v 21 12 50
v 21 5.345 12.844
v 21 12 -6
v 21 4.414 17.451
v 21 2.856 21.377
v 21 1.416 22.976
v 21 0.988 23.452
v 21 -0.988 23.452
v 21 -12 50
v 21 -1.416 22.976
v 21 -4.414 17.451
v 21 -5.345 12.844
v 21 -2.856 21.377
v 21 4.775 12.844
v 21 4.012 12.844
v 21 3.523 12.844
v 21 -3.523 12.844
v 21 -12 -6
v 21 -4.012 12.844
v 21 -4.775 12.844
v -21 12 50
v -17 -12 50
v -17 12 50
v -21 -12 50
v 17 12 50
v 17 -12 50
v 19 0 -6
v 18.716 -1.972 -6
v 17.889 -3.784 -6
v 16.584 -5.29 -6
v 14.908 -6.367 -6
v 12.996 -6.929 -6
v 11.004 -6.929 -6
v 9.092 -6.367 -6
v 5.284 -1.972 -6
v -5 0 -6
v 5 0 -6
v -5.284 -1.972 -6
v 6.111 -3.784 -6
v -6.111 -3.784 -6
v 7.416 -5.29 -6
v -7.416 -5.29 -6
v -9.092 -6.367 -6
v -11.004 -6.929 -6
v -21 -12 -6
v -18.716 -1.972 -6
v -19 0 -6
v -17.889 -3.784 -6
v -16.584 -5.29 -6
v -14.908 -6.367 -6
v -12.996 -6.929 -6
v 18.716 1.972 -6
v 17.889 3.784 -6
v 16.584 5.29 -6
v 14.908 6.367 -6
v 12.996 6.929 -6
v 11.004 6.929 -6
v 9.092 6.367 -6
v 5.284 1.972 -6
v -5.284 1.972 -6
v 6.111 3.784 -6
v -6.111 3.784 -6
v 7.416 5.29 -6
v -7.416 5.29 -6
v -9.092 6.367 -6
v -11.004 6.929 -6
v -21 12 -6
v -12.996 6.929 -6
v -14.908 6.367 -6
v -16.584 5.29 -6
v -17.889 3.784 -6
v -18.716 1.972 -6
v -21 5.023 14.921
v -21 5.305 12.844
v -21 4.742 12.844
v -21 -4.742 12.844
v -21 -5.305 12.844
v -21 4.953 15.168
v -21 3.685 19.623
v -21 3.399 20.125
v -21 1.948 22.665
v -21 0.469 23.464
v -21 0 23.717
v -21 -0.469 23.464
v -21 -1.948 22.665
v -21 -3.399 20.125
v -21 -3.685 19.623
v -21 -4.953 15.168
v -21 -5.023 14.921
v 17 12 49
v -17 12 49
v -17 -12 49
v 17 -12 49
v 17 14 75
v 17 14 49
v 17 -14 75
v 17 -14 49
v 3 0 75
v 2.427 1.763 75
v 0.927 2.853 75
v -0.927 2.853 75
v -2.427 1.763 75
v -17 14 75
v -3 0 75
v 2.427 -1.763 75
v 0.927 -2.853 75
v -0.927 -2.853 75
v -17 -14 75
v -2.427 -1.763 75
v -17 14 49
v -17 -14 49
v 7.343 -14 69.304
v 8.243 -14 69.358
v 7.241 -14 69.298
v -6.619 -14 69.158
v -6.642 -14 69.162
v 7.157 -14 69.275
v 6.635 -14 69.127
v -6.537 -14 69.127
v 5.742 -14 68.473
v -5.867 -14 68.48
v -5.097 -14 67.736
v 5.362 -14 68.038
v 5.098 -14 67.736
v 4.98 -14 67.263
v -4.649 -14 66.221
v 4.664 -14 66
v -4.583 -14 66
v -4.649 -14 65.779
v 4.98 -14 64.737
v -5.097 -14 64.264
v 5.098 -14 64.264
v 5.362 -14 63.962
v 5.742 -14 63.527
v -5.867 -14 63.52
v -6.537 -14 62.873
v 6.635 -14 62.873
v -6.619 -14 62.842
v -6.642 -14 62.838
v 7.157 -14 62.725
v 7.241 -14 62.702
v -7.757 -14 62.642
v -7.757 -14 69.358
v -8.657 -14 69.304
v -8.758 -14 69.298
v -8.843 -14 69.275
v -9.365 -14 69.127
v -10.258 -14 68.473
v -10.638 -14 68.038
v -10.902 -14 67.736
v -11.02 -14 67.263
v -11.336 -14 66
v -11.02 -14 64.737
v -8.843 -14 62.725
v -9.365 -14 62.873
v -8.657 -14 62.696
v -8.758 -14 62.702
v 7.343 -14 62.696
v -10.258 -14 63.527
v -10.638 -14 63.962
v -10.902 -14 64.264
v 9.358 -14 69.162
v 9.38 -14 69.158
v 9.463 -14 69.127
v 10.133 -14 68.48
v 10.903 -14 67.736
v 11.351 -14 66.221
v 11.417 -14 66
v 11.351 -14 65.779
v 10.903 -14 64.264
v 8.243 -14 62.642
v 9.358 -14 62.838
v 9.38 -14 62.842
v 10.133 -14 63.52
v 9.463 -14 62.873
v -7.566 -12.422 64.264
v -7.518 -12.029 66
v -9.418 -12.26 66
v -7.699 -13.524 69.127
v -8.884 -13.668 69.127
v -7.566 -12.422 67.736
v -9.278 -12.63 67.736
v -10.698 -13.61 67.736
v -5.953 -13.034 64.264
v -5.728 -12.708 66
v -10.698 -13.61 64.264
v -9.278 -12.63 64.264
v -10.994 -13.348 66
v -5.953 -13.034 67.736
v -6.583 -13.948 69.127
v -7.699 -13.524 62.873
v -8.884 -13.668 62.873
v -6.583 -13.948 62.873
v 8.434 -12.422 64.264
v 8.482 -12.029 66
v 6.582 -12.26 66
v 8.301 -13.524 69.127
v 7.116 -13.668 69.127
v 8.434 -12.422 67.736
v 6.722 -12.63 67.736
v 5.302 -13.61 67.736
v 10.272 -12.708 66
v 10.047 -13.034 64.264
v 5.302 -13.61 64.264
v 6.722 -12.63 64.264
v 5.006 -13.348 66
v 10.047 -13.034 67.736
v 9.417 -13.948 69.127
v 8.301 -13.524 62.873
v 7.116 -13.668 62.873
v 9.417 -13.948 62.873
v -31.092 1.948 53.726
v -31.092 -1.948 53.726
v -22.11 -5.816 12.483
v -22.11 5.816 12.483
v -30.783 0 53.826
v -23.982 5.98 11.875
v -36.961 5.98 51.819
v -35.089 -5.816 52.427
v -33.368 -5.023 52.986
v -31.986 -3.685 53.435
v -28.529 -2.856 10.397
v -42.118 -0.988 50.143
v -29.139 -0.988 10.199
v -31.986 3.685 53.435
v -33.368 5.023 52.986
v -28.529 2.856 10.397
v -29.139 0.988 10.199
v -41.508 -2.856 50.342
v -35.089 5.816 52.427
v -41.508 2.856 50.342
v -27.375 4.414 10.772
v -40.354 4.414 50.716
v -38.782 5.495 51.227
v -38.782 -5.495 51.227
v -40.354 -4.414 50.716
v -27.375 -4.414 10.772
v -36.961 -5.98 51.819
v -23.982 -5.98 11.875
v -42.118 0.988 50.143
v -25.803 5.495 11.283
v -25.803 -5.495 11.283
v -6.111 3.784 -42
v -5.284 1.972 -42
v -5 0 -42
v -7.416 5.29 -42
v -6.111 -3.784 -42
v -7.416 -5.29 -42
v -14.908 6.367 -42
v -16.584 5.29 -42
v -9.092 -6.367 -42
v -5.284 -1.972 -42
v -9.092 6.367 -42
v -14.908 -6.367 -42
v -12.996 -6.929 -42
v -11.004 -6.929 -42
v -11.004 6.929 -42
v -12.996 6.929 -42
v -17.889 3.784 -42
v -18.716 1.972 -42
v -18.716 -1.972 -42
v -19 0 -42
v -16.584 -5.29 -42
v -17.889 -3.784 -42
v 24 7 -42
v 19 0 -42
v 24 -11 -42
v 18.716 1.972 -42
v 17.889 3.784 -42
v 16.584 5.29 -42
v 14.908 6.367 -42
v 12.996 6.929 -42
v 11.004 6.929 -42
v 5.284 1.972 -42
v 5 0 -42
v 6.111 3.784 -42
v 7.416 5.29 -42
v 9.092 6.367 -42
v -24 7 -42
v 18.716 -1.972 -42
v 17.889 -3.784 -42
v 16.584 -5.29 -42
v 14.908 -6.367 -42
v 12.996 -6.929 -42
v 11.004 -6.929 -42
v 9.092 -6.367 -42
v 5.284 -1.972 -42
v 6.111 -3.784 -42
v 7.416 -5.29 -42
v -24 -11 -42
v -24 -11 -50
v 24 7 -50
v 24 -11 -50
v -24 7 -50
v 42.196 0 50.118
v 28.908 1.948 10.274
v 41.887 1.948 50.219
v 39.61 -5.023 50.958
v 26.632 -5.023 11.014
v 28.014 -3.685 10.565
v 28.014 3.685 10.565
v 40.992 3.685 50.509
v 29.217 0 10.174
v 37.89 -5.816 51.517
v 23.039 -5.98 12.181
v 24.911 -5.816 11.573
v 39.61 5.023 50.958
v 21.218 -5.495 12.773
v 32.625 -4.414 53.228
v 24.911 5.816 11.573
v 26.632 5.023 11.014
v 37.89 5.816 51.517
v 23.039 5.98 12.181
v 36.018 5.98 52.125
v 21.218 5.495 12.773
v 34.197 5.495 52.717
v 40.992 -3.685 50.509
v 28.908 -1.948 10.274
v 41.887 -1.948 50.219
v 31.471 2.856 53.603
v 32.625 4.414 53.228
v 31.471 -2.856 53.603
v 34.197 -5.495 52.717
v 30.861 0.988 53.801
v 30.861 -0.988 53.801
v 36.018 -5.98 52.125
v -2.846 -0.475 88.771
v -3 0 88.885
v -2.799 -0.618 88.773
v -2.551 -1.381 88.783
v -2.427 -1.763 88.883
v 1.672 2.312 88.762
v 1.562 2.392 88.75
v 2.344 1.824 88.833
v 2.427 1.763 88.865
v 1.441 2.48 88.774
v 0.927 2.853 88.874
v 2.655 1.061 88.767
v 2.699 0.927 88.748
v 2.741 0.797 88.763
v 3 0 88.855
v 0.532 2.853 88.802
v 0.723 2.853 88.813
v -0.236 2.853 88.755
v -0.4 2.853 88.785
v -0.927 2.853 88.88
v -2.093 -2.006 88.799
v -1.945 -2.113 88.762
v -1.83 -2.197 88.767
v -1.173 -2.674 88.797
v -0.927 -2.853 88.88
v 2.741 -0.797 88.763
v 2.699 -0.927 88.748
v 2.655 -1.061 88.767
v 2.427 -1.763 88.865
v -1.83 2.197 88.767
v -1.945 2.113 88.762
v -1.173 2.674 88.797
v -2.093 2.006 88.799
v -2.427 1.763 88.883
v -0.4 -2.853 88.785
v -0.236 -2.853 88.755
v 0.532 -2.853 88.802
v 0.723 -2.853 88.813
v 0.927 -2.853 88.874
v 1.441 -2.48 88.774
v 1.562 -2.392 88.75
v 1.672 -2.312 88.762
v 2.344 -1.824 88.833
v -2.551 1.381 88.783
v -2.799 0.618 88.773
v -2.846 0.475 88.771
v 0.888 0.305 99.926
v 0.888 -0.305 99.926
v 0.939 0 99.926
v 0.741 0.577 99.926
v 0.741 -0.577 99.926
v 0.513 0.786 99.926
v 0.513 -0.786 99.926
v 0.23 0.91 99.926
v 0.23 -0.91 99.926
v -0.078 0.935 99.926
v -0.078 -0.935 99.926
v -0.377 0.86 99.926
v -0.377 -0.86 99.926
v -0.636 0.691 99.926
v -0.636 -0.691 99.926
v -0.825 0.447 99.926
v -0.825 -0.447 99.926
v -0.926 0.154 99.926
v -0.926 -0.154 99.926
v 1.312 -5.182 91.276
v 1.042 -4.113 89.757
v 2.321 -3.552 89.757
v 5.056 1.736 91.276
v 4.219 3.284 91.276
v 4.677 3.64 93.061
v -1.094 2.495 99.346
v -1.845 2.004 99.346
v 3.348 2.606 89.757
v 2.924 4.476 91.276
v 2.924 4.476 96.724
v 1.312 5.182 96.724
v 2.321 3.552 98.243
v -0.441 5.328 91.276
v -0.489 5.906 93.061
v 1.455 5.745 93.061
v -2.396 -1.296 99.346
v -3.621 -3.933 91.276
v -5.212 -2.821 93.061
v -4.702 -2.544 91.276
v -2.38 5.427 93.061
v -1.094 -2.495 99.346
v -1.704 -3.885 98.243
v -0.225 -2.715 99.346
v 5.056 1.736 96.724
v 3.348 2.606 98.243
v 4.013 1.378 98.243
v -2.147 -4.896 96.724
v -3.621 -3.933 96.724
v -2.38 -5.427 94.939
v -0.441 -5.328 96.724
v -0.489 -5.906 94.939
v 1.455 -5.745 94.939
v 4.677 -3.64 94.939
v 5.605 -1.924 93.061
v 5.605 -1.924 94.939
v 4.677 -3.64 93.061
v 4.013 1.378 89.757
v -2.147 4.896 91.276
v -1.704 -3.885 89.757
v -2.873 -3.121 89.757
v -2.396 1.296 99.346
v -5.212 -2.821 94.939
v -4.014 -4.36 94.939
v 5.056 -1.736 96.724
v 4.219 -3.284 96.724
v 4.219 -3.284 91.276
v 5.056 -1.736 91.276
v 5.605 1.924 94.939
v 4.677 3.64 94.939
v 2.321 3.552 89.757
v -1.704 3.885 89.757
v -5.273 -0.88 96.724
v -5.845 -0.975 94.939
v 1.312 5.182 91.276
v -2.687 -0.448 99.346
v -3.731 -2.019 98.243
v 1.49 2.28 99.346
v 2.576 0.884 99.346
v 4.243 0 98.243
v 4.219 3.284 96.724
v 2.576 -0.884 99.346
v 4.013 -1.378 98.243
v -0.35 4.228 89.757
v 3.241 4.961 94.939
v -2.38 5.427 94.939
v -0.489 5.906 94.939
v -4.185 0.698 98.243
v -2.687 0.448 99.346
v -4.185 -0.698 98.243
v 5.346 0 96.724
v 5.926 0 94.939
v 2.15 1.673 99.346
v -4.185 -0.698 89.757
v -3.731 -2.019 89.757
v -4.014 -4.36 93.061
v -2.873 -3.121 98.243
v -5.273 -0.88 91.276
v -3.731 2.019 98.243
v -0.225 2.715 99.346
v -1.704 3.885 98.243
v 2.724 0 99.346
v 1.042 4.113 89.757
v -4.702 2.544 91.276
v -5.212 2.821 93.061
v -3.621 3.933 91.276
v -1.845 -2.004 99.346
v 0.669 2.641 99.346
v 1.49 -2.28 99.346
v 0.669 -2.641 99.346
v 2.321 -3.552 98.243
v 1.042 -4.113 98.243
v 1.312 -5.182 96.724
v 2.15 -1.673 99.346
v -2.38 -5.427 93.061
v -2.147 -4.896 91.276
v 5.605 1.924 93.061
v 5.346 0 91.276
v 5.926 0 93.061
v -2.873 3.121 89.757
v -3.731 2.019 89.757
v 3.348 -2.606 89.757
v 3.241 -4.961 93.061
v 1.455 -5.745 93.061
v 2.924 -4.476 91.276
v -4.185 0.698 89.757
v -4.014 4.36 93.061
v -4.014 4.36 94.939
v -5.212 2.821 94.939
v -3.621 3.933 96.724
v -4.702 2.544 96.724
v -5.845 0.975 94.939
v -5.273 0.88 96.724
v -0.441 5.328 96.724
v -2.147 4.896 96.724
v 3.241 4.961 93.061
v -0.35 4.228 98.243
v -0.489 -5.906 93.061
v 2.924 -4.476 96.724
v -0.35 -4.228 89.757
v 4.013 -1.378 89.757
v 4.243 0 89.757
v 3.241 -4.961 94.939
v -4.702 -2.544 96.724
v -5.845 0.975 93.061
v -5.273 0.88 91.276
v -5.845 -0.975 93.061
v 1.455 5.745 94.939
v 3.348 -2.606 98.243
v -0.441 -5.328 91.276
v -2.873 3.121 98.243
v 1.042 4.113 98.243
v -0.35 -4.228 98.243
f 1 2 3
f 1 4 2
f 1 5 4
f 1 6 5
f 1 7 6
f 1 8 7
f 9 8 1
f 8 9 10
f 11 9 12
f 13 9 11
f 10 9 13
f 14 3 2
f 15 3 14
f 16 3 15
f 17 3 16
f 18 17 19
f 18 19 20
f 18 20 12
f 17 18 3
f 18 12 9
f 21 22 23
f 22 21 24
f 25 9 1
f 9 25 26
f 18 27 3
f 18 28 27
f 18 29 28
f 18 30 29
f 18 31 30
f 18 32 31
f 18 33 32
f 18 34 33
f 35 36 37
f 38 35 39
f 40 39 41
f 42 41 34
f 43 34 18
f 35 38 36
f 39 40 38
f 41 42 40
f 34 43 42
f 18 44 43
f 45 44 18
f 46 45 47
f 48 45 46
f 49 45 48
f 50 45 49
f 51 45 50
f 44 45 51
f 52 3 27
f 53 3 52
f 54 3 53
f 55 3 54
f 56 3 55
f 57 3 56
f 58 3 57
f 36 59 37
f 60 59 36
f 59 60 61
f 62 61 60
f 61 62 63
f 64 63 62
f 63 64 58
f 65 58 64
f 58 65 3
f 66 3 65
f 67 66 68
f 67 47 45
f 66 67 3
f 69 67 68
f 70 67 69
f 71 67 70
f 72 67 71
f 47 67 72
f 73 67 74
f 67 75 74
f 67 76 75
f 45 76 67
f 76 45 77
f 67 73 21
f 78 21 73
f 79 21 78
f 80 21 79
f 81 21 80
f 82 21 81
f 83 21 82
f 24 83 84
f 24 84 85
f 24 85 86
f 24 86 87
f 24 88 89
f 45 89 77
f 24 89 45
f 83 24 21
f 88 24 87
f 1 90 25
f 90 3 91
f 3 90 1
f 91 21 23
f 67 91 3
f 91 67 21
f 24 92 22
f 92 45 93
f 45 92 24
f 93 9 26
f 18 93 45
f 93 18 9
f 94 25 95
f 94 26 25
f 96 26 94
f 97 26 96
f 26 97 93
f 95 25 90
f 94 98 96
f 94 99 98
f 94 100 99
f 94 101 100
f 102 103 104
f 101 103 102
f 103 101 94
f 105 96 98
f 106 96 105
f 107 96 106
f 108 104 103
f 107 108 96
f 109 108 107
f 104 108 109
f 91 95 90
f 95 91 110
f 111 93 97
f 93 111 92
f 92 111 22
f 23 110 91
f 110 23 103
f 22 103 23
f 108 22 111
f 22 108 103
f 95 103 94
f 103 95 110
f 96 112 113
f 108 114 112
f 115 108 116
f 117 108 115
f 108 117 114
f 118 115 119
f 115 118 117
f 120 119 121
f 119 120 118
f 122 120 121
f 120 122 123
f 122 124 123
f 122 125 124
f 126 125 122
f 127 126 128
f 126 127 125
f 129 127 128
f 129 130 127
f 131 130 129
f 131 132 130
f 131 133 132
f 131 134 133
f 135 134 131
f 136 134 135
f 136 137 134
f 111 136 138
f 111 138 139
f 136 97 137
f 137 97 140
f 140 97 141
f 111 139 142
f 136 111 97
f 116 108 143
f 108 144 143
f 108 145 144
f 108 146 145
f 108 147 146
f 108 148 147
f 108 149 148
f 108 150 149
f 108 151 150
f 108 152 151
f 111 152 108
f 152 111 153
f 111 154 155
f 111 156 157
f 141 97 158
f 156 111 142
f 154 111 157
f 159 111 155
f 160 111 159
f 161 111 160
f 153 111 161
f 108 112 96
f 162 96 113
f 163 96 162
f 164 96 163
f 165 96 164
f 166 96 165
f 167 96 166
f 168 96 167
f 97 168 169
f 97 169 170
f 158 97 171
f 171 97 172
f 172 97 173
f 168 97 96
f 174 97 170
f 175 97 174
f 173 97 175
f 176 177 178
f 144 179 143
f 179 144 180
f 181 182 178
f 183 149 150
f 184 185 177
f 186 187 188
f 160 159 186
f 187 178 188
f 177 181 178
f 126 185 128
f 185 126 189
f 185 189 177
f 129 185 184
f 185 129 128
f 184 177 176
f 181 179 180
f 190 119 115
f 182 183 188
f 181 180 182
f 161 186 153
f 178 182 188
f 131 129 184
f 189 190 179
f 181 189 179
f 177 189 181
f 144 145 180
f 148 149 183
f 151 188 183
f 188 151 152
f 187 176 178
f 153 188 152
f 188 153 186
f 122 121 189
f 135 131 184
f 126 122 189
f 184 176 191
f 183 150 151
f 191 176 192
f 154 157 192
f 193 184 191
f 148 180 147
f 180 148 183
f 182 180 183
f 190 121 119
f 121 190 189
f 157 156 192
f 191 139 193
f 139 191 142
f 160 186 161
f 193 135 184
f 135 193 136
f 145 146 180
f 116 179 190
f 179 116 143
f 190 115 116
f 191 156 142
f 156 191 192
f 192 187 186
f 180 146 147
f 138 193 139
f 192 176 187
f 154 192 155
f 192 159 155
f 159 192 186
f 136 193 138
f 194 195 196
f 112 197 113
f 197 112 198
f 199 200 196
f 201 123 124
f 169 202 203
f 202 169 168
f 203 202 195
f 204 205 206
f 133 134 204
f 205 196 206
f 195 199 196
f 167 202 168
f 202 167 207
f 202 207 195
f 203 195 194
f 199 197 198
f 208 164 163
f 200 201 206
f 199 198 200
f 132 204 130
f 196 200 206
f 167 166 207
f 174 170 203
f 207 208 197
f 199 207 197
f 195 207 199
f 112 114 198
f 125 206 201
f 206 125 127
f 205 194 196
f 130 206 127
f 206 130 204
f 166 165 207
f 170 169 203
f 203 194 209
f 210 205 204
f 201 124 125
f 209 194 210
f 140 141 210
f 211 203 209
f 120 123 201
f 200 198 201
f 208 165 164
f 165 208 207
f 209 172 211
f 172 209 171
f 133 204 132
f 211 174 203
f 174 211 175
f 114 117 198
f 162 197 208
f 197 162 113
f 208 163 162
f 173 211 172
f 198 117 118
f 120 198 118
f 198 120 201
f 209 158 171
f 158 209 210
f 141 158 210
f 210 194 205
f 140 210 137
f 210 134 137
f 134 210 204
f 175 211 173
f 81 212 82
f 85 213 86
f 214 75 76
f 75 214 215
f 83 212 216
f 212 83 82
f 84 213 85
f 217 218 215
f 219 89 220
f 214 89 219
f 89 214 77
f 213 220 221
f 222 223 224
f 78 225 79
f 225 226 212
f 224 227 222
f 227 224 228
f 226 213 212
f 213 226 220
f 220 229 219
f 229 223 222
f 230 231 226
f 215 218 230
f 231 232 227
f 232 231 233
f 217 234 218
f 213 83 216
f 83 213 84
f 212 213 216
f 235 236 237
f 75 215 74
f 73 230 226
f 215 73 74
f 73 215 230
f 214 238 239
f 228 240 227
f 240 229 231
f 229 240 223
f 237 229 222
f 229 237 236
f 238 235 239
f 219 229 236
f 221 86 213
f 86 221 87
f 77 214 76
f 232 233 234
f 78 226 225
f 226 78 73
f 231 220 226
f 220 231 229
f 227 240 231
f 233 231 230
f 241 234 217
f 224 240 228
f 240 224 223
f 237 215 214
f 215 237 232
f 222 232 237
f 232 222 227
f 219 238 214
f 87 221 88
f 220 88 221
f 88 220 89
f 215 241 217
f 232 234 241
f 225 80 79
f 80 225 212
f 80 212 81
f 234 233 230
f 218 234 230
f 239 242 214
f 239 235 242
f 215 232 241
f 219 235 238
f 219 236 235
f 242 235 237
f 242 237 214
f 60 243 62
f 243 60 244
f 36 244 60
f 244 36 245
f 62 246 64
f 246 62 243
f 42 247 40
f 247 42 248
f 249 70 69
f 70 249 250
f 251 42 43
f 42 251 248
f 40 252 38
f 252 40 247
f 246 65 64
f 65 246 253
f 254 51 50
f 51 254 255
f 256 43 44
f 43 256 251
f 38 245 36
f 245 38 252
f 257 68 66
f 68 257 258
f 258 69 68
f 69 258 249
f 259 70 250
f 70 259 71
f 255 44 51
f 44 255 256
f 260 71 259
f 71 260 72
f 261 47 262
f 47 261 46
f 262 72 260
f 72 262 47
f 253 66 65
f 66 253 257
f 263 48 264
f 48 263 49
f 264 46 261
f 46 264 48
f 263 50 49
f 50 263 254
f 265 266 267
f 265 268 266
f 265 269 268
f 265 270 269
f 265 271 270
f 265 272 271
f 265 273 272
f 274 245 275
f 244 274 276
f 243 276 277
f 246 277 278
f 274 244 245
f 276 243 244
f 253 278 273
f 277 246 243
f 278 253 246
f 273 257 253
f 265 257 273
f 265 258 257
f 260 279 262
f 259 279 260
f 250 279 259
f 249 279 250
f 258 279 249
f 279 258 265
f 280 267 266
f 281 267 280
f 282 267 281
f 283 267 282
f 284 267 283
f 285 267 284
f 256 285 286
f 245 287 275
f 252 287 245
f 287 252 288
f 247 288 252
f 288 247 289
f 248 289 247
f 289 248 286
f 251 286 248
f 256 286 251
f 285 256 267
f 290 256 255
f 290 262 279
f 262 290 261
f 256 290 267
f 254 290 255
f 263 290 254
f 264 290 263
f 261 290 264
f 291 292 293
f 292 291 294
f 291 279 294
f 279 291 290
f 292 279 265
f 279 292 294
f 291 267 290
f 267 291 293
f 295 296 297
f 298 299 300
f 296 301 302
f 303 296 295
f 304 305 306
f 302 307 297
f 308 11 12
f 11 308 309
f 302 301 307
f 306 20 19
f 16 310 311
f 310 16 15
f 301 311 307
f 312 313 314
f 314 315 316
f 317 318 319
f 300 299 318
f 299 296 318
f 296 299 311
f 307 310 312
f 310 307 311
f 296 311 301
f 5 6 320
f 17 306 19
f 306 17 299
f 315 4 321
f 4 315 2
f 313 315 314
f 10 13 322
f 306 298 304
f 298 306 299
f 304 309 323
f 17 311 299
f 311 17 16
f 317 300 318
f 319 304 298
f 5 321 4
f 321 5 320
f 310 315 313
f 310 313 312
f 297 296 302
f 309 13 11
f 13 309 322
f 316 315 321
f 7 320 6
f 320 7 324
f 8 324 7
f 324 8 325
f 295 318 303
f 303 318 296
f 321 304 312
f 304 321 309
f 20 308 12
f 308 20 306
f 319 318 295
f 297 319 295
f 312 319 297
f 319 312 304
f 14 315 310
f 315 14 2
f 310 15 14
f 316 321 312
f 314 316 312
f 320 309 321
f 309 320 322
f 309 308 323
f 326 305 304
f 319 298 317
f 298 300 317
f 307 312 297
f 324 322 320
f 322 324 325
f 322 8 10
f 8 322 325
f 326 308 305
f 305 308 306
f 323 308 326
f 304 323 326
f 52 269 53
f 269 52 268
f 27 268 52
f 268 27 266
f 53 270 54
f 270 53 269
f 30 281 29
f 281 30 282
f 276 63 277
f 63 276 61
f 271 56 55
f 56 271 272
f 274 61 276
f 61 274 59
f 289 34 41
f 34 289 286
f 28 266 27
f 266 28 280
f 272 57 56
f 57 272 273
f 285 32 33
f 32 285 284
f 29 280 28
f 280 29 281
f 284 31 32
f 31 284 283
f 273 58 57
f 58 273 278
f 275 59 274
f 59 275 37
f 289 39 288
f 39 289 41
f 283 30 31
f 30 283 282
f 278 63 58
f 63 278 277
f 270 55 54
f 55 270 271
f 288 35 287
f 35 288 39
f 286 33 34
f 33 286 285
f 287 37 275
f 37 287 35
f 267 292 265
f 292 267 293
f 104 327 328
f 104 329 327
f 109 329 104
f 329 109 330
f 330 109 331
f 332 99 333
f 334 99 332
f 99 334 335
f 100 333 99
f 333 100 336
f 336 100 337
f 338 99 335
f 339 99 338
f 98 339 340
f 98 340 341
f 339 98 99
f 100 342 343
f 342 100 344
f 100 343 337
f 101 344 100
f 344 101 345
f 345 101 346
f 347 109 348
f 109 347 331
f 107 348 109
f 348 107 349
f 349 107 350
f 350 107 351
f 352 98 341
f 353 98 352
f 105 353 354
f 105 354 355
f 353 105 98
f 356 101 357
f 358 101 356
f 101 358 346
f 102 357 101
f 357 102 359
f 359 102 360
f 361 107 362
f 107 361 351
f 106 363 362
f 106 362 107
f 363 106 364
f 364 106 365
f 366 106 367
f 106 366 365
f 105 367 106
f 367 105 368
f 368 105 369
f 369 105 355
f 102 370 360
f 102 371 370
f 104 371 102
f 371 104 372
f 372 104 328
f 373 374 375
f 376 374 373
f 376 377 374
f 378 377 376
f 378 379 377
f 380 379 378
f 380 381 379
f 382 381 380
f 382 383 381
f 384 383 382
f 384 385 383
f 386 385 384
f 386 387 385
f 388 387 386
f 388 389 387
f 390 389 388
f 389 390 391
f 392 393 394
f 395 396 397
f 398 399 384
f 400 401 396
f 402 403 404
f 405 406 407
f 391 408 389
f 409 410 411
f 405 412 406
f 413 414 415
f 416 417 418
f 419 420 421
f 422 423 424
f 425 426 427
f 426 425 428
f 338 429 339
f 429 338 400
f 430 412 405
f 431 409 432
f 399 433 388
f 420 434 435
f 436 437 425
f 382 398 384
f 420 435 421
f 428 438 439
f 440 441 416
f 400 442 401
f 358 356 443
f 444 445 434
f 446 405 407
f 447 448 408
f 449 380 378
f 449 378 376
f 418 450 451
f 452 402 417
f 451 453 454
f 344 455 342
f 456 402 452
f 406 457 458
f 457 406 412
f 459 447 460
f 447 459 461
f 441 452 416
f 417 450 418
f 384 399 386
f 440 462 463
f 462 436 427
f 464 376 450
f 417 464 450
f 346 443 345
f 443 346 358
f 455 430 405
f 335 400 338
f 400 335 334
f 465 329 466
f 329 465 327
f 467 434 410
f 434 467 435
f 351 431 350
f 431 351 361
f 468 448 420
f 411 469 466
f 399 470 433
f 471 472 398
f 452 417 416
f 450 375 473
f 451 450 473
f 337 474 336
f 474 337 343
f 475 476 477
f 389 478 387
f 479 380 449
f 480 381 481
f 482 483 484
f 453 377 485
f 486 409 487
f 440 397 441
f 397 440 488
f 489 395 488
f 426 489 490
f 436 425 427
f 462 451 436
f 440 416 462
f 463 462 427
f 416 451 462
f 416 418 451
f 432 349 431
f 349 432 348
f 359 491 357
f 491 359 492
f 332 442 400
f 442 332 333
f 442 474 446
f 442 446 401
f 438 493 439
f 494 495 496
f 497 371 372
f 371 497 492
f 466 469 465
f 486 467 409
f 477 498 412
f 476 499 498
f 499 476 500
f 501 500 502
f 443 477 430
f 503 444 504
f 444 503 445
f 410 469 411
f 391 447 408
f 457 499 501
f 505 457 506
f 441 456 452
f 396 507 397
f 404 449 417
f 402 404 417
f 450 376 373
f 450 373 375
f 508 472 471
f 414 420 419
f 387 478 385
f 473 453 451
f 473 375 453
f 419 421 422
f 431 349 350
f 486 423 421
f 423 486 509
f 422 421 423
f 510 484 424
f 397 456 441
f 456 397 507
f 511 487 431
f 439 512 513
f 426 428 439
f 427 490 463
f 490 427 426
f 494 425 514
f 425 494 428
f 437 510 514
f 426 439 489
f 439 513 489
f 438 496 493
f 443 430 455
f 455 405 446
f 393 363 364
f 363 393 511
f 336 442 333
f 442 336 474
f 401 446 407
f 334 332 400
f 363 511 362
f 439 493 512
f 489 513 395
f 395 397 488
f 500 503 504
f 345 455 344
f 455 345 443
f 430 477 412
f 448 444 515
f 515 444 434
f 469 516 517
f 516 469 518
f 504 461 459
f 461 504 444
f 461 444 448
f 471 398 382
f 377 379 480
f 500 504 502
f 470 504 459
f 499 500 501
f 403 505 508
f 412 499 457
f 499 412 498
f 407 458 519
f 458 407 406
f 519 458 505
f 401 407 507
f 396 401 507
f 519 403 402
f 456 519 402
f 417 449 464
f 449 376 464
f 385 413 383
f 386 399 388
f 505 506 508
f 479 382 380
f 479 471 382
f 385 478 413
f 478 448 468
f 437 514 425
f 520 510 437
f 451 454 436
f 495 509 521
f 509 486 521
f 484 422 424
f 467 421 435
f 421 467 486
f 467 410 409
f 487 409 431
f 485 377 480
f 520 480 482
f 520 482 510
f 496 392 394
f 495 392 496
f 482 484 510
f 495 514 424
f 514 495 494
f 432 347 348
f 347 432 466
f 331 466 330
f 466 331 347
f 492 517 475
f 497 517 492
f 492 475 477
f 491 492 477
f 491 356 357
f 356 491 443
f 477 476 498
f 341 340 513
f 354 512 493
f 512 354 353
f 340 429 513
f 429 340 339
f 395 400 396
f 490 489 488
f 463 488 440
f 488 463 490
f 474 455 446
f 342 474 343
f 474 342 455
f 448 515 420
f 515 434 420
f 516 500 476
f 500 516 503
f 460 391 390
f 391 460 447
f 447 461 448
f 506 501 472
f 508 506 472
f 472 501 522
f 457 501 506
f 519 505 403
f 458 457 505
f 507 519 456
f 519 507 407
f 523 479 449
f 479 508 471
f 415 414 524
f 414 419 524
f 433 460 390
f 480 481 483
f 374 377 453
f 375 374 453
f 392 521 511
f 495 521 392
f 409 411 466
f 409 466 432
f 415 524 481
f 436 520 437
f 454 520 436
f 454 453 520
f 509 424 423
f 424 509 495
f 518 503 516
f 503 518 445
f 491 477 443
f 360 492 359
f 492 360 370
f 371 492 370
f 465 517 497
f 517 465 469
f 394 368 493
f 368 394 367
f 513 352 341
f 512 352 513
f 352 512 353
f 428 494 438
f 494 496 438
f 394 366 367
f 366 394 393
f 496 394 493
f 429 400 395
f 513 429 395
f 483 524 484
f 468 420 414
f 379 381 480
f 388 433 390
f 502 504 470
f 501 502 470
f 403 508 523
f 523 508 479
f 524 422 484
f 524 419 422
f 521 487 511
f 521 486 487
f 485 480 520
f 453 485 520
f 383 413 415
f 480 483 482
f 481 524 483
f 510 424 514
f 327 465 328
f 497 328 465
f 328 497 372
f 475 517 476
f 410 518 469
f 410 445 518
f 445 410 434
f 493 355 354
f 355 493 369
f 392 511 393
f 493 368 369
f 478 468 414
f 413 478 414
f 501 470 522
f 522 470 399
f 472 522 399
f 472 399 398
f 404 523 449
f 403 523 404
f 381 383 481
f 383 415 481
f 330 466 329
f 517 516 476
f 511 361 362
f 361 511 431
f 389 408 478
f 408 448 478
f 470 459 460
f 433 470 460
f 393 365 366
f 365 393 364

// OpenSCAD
// 3DScad sample: parametric robot
// Uses only the currently round-trippable subset.

module scene_model() {
    body_w = 42;
    body_d = 24;
    body_h = 56;
    limb_r = 6;

    union() {
        translate([0, 0, 22]) {
            difference() {
                cube([body_w, body_d, body_h], center=true);
                translate([0, -body_d/2 - 1, 36]) {
                    cube([18, 8, 8], center=true);
                }
            }
        }

        translate([0, 0, 62]) {
            difference() {
                cube([34, 28, 26], center=true);
                translate([-8, -16, 4]) {
                    sphere(r=4);
                }
                translate([8, -16, 4]) {
                    sphere(r=4);
                }
            }
        }

        for (side = [-1 : 2 : 1]) {
            translate([side*(body_w/2 + 9), 0, 32]) {
                rotate([0, 18*side, 0]) {
                    cylinder(h=42, r=limb_r, center=true);
                }
            }
            translate([side*12, 0, -24]) {
                cylinder(h=38, r=limb_r + 1, center=true);
            }
            translate([side*12, -2, -46]) {
                cube([24, 18, 8], center=true);
            }
        }

        translate([0, 0, 82]) {
            cylinder(h=18, r=3, center=true);
        }
        translate([0, 0, 94]) {
            sphere(r=6);
        }
    }
}

scene_model();
